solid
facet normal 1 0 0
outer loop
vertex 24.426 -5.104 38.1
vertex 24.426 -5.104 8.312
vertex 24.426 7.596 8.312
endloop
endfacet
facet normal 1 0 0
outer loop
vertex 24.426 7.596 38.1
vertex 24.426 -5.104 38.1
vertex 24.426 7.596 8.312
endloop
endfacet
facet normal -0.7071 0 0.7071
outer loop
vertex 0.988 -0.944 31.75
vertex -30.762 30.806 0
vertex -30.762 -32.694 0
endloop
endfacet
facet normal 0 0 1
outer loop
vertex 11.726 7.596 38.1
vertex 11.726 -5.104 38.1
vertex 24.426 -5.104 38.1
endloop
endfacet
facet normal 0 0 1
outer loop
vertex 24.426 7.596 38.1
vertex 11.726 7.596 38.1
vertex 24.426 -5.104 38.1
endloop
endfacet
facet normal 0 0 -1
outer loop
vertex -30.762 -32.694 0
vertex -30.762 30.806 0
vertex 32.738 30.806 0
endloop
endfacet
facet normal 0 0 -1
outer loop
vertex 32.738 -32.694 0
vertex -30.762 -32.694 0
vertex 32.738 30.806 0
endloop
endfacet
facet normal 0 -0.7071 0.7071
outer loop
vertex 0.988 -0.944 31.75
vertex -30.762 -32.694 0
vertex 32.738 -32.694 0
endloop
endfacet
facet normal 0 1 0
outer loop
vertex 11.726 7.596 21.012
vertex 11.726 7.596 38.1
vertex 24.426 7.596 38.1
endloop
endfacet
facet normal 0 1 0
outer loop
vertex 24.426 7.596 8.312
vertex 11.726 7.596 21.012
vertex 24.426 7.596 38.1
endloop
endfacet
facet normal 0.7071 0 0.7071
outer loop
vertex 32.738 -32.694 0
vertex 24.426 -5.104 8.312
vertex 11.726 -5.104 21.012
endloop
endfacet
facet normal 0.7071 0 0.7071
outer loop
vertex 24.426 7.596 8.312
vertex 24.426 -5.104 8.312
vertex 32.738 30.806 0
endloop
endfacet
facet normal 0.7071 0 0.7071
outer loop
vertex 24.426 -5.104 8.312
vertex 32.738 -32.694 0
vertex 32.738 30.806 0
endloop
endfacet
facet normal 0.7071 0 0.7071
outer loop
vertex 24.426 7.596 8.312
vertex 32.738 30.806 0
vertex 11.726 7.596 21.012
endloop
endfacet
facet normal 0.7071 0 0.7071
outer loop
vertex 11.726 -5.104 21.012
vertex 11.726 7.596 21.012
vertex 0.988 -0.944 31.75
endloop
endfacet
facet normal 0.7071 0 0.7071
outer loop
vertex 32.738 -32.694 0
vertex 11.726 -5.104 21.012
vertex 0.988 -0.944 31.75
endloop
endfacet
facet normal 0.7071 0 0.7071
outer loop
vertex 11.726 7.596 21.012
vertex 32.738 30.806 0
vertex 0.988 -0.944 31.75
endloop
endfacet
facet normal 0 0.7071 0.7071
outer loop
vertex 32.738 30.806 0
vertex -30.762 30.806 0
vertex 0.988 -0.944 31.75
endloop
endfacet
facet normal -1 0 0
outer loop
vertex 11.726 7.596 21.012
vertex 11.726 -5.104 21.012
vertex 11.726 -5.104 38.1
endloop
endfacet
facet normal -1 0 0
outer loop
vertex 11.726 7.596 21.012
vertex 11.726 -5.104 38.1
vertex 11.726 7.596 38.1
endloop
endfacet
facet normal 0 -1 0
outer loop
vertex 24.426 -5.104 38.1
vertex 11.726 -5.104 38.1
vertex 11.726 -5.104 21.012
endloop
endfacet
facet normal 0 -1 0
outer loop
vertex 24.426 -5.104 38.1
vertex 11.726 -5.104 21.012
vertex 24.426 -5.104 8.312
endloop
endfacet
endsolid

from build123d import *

# Parameters (mm, degrees)
F0_W        = 63.5
F0_H        = 63.5
F0_W_2      = 12.7
F0_H_2      = 12.7
F1_DEPTH    = 31.75
F2_T1_DEPTH = 226.8018697358
F2_T3_DEPTH = 226.8018697358
F3_DEPTH    = 38.1


# Not quite as in the source:
# - a fillet or chamfer that OpenCascade refuses, or shapes differently, is made with other operations: its cross-section is extruded or revolved along the edge and cut away or added


with BuildPart() as f1:
    # F0 (on Top) → F1 (new body)
    with BuildSketch(Plane.XY):
        with Locations((0.9875343293, -0.9437446371)):
            Rectangle(F0_W, F0_H)
        with Locations((18.0756017402, 1.2459141038)):
            Rectangle(F0_W_2, F0_H_2, mode=Mode.SUBTRACT)
    extrude(amount=F1_DEPTH)

    # F2: chamfer of 31.75 on 4 edges, made by hand

    # F2_s2 → F2_t1 (cut)
    with BuildSketch(Plane.YZ.offset(-112.4134005386)):
        Polygon((-32.6937446371, 0), (-0.9437446371, 31.75), (-32.6937446371, 31.75), align=None)
        Polygon((30.8062553629, 0), (-0.9437446371, 31.75), (30.8062553629, 31.75), align=None)
    extrude(amount=F2_T1_DEPTH, mode=Mode.SUBTRACT)

    # F2_s4 → F2_t3 (cut)
    with BuildSketch(Plane.XZ.offset(-112.4571902308)):
        Polygon((32.7375343293, 0), (0.9875343293, 31.75), (32.7375343293, 31.75), align=None)
        Polygon((-30.7624656707, 0), (0.9875343293, 31.75), (-30.7624656707, 31.75), align=None)
    extrude(amount=F2_T3_DEPTH, mode=Mode.SUBTRACT)

    # F0 (on Top) → F3 (join)
    with BuildSketch(Plane.XY):
        with Locations((18.0756017402, 1.2459141038)):
            Rectangle(F0_W_2, F0_H_2)
    extrude(amount=F3_DEPTH)


solid = f1.part
